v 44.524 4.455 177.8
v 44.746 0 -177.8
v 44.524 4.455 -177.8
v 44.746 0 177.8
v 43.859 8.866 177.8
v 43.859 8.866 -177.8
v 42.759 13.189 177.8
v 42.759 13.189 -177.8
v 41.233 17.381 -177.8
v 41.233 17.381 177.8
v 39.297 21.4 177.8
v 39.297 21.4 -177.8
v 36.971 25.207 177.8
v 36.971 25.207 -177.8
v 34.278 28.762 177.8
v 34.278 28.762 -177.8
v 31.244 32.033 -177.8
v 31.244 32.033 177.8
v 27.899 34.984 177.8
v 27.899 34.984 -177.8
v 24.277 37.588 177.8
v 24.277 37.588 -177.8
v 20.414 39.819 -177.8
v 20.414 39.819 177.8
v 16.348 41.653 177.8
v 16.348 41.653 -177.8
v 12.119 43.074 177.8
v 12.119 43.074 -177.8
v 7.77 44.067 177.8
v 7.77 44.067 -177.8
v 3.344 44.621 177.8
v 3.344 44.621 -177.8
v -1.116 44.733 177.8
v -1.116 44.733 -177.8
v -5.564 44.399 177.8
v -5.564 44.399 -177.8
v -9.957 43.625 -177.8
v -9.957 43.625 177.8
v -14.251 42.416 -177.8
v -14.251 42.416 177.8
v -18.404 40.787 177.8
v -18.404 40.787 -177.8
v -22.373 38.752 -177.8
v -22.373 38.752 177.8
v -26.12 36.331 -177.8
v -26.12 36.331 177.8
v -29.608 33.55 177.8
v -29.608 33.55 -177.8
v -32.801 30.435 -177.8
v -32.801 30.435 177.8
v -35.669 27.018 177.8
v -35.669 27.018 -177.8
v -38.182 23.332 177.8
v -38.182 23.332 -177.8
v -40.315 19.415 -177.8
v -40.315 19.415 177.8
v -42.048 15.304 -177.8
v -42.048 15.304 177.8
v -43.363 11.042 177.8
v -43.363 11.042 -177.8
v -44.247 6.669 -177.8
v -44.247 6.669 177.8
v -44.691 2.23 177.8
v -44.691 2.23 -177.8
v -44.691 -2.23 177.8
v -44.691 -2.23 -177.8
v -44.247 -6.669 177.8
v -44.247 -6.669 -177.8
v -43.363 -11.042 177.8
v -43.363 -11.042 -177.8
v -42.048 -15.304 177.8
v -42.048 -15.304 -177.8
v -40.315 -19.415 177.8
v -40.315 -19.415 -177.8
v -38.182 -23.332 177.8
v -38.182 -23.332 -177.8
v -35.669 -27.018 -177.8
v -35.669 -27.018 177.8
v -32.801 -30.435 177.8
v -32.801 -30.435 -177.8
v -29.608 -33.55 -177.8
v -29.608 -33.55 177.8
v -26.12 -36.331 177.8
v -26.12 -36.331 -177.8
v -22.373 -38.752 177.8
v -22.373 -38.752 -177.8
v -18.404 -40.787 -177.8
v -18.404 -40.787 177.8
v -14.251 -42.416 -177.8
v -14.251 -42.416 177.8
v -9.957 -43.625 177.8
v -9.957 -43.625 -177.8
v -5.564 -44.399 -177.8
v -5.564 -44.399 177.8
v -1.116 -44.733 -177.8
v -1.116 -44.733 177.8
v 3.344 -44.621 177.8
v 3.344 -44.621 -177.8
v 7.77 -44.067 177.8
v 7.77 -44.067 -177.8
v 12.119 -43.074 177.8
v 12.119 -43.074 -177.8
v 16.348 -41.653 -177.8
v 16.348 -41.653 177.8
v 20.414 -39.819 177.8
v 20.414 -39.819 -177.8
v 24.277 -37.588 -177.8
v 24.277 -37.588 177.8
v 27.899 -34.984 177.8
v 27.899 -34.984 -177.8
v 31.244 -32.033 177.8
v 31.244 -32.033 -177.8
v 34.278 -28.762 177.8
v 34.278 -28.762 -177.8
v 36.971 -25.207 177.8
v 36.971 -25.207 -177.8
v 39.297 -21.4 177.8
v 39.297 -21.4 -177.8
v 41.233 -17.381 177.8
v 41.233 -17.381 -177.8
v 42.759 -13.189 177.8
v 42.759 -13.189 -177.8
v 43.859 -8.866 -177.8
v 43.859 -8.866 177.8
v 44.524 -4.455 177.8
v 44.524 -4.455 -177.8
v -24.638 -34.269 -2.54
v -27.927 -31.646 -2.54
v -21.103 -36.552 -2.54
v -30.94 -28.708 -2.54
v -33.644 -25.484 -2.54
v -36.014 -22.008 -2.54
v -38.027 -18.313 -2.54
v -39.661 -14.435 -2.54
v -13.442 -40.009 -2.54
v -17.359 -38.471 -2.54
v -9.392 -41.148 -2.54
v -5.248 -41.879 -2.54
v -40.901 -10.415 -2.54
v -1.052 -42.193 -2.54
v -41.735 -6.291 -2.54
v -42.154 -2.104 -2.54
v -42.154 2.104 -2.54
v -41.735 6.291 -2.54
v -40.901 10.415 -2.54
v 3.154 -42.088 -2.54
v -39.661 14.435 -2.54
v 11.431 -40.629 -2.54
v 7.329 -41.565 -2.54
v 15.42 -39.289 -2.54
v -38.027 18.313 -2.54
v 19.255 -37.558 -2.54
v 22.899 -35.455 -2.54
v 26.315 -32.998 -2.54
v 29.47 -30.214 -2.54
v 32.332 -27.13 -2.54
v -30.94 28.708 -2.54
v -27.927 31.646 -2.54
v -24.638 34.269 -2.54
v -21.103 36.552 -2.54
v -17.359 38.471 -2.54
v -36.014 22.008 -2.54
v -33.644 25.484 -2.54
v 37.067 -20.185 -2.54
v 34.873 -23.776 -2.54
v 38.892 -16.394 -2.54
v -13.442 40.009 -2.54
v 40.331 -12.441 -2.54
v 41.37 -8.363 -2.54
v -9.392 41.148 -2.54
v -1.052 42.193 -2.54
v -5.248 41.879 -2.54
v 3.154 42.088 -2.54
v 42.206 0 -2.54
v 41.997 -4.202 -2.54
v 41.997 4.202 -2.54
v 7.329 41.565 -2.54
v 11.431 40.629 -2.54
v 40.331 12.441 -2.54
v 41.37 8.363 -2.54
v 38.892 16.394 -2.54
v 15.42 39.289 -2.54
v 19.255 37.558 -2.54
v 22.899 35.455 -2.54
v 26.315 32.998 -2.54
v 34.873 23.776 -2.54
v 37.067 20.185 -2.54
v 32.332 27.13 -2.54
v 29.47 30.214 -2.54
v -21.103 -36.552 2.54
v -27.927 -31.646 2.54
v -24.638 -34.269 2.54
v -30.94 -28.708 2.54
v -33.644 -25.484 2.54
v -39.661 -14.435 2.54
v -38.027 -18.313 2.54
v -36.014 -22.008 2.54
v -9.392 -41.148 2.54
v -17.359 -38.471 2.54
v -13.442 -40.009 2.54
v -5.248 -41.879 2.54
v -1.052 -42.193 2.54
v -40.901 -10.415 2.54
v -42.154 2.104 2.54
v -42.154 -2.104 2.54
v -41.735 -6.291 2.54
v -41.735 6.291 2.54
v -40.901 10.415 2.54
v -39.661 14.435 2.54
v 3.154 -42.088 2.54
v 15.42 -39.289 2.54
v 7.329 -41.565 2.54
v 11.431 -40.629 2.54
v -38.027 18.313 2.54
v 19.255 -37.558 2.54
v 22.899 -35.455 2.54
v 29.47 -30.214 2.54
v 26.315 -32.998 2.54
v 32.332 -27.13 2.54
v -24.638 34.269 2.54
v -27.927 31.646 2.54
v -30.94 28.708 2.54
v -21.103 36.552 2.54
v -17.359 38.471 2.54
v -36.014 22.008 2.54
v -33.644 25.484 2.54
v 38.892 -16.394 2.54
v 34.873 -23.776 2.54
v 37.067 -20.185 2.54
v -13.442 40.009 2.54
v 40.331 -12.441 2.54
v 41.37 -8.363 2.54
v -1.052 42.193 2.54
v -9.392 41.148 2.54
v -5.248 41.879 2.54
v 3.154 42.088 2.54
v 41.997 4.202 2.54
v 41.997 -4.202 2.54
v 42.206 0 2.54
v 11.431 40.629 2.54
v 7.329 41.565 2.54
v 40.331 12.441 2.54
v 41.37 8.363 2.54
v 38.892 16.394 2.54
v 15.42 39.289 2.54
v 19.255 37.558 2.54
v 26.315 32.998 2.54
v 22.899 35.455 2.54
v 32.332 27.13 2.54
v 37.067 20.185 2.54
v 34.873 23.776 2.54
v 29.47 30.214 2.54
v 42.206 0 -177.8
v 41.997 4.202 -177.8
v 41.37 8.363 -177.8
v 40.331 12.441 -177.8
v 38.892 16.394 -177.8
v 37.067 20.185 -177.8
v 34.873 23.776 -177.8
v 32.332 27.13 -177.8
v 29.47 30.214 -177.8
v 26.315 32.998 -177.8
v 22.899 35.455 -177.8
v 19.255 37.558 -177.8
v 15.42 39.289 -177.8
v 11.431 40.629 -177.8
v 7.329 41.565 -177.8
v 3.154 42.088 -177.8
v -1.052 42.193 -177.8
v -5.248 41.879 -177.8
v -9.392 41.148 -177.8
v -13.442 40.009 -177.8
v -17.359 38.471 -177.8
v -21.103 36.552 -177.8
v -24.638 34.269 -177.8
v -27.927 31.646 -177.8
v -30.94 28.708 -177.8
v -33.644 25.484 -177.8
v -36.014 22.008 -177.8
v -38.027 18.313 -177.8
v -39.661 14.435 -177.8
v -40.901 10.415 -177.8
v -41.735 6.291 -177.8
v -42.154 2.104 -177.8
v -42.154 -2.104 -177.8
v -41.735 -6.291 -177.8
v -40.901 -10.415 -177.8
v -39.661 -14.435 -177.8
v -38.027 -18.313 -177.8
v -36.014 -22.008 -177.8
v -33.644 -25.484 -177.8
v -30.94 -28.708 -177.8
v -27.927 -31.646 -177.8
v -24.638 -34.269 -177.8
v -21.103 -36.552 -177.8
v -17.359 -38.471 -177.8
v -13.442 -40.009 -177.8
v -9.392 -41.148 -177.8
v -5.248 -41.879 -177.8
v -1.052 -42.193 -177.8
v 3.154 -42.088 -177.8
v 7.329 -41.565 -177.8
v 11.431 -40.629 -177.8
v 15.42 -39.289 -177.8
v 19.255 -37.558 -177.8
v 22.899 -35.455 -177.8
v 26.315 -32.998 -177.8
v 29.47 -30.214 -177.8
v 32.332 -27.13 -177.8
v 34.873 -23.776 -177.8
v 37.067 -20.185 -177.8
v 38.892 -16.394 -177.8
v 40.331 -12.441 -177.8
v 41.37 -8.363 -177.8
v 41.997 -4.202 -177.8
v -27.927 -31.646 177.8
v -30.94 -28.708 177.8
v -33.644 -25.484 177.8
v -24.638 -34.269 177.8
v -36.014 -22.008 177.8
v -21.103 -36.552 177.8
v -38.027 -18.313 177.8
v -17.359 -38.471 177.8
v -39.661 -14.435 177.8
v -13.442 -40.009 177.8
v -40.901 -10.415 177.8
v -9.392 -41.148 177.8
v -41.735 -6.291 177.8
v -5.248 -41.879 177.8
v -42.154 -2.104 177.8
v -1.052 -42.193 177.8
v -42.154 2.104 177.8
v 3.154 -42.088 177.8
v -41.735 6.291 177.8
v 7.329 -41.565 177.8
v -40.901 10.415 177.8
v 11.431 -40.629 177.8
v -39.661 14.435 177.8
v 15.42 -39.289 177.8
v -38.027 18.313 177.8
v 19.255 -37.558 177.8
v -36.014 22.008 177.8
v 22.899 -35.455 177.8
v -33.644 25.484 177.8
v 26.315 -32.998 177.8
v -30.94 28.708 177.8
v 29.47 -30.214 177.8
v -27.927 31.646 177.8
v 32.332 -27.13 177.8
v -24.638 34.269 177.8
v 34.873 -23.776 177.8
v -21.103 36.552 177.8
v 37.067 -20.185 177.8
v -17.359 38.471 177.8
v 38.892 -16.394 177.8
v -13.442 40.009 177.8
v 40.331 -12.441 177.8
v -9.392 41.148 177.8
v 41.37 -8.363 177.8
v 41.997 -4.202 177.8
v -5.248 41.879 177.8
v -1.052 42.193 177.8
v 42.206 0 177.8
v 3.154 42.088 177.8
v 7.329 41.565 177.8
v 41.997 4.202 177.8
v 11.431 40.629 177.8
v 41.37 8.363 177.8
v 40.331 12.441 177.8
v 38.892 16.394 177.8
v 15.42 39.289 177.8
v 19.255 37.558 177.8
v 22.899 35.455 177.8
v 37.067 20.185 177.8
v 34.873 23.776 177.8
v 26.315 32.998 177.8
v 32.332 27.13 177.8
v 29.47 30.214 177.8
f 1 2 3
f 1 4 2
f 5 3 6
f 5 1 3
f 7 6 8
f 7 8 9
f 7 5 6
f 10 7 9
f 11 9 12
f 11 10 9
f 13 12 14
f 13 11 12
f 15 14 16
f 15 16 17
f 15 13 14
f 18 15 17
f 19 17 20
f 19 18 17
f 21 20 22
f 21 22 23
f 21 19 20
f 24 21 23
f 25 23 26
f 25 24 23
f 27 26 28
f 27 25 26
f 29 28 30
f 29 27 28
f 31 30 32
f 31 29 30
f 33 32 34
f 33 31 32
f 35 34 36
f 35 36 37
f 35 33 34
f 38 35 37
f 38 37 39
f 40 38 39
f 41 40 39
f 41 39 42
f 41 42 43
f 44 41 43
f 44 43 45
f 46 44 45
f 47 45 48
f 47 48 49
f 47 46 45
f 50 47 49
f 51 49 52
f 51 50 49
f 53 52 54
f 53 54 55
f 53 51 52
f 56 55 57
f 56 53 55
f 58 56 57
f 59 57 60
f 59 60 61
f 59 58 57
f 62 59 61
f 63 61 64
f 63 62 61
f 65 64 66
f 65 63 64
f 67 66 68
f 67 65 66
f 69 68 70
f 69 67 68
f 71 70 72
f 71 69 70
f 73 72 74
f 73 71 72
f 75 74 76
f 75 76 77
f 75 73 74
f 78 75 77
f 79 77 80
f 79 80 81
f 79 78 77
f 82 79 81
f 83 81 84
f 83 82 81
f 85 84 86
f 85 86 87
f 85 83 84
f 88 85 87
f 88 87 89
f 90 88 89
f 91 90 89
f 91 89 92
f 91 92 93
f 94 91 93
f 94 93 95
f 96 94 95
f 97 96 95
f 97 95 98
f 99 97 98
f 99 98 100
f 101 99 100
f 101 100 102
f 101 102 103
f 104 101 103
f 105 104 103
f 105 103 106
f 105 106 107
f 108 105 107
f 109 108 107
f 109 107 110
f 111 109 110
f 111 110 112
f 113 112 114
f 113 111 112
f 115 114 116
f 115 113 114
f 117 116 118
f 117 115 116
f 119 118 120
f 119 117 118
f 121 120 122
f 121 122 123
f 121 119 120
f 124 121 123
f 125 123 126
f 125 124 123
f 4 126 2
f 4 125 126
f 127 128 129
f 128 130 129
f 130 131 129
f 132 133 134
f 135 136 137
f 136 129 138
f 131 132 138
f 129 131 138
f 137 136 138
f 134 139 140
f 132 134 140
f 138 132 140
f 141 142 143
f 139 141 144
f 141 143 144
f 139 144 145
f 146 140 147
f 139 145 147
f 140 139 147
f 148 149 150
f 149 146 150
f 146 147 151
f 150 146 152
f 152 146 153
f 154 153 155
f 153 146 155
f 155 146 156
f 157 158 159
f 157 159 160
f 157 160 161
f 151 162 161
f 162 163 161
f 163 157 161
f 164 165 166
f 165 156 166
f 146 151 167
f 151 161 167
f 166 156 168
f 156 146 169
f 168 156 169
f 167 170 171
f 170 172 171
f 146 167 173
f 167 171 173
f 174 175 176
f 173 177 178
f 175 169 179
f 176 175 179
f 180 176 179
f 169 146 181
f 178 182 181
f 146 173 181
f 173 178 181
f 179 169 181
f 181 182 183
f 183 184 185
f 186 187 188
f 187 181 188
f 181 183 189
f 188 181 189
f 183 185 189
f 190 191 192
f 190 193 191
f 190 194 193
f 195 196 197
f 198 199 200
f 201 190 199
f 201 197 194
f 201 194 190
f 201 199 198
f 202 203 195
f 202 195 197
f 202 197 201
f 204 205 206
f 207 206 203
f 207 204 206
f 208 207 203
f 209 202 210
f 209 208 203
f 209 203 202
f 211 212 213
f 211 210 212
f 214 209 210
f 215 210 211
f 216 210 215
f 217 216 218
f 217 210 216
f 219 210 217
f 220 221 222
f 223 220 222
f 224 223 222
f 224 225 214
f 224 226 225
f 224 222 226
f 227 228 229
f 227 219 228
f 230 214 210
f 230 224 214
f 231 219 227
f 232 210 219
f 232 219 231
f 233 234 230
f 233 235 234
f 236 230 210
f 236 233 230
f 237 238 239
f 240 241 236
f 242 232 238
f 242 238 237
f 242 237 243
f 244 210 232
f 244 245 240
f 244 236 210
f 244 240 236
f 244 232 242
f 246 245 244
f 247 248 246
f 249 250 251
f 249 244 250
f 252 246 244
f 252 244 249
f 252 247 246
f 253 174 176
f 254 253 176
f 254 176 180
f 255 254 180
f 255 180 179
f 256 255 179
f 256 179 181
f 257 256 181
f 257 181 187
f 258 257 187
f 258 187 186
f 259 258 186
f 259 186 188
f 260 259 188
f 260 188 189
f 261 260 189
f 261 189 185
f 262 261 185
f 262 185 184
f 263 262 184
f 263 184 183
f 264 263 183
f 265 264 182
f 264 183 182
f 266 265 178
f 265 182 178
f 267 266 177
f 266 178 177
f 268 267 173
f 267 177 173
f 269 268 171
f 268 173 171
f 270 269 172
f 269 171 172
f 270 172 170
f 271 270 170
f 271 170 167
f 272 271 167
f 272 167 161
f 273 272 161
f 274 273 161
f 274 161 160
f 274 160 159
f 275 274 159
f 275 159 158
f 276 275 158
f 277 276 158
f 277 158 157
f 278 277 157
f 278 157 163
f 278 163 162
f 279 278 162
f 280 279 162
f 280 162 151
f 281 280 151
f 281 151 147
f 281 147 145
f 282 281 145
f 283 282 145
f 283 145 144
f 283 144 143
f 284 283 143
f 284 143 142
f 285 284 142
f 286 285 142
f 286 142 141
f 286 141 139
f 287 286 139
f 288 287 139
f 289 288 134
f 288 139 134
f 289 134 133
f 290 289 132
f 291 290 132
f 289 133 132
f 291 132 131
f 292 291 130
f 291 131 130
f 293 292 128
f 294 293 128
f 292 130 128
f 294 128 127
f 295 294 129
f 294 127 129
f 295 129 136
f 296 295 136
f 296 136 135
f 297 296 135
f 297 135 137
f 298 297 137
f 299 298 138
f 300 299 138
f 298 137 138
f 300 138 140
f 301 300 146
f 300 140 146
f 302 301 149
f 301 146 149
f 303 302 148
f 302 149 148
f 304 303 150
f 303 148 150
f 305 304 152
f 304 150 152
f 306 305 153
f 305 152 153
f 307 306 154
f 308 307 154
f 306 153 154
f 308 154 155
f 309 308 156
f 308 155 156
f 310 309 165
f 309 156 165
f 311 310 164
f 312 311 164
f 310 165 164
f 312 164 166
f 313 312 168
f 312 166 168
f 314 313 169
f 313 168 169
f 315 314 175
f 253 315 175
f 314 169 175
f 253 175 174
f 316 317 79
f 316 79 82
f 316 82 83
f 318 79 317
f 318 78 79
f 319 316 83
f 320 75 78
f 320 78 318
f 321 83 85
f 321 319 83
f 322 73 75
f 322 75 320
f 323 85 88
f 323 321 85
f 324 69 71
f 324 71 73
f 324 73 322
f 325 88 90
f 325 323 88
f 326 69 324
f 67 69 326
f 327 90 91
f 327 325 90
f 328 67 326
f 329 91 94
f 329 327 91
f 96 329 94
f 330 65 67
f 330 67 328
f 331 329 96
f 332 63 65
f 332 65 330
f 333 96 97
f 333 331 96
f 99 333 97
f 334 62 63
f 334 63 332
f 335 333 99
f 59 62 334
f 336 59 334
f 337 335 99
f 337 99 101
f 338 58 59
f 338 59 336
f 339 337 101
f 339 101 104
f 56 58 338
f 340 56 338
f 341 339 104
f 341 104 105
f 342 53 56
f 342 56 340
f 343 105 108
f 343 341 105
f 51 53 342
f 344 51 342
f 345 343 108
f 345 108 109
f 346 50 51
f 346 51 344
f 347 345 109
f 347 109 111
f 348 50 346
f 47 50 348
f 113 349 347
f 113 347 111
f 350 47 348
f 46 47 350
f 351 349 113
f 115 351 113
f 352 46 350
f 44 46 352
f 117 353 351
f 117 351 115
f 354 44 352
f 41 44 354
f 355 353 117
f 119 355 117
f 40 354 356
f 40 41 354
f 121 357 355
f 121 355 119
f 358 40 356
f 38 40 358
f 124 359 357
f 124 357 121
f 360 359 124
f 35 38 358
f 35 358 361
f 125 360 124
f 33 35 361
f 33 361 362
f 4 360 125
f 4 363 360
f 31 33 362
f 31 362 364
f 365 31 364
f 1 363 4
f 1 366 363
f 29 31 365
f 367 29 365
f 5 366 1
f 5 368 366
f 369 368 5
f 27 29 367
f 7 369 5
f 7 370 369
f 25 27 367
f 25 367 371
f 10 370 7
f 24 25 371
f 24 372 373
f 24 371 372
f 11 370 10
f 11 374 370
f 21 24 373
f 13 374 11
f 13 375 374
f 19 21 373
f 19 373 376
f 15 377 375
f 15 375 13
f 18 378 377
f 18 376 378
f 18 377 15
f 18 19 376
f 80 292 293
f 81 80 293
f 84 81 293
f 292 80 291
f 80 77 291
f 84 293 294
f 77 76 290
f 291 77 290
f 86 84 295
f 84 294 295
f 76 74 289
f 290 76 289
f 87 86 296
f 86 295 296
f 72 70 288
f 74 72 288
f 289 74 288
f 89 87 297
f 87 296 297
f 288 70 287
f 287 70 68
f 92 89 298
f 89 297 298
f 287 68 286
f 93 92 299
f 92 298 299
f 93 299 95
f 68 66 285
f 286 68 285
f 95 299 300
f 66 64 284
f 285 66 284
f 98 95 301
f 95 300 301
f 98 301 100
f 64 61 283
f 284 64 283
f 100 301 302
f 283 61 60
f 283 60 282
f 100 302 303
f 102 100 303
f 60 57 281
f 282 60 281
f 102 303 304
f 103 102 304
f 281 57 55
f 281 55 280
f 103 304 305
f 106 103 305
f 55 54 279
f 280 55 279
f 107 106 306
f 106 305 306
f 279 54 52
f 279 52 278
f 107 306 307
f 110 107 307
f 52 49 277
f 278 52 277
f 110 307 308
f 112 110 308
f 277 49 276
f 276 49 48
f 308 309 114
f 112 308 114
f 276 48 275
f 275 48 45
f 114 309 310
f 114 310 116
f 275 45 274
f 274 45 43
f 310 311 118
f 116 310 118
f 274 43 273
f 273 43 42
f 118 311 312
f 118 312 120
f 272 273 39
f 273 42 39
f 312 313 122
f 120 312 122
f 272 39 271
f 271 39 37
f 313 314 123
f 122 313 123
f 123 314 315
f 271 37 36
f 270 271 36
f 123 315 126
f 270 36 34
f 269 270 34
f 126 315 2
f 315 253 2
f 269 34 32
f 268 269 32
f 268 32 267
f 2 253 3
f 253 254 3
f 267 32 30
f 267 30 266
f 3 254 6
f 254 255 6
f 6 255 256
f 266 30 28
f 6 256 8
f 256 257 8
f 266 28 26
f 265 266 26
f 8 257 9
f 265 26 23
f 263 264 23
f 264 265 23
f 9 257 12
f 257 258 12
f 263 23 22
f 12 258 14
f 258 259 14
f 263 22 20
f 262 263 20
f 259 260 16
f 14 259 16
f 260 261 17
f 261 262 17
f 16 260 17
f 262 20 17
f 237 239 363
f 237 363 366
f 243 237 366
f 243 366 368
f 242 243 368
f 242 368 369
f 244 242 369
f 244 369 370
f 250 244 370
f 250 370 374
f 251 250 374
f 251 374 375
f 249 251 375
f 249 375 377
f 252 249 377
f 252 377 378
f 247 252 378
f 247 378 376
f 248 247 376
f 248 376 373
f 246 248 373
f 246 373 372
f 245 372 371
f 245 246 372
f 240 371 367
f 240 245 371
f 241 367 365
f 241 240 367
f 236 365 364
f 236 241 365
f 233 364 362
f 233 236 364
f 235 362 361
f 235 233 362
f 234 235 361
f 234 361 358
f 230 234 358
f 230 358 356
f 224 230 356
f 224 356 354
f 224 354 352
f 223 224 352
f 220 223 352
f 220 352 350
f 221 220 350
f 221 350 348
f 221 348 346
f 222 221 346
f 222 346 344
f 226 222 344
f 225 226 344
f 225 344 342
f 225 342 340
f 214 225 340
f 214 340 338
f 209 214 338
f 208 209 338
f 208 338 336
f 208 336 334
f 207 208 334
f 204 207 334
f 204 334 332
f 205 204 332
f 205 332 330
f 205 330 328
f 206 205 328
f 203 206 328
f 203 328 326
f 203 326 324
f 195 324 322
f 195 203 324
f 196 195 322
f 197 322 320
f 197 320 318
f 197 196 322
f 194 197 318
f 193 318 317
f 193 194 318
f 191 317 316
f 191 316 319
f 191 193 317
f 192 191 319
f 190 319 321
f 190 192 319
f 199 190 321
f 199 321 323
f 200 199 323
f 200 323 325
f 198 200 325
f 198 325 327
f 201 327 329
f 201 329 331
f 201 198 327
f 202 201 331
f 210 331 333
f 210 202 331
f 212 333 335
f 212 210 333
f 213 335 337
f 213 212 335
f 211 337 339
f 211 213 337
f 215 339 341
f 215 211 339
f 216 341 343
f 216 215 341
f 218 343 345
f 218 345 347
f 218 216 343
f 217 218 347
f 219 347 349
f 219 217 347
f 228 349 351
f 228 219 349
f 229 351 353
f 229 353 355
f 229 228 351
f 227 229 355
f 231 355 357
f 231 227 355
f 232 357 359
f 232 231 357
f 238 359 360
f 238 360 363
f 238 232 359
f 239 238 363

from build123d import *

# Parameters (mm, degrees)
F0_R     = 44.746468
F1_DEPTH = 177.8
F2_T     = -2.54


with BuildPart() as f1:
    # F0 (on Top) → F1 (new body)
    with BuildSketch(Plane.XY):
        Circle(F0_R)
    extrude(amount=F1_DEPTH)

    # F2
    f2_openings = [f1.faces().sort_by_distance(p)[0] for p in [
        (0, 0, 177.8),
    ]]
    offset(amount=F2_T, openings=f2_openings)

    # F3: F1 across plane


with BuildPart() as f1_1:
    add(f1.part)
    add(f1.part.mirror(Plane.XY))


solid = f1_1.part
